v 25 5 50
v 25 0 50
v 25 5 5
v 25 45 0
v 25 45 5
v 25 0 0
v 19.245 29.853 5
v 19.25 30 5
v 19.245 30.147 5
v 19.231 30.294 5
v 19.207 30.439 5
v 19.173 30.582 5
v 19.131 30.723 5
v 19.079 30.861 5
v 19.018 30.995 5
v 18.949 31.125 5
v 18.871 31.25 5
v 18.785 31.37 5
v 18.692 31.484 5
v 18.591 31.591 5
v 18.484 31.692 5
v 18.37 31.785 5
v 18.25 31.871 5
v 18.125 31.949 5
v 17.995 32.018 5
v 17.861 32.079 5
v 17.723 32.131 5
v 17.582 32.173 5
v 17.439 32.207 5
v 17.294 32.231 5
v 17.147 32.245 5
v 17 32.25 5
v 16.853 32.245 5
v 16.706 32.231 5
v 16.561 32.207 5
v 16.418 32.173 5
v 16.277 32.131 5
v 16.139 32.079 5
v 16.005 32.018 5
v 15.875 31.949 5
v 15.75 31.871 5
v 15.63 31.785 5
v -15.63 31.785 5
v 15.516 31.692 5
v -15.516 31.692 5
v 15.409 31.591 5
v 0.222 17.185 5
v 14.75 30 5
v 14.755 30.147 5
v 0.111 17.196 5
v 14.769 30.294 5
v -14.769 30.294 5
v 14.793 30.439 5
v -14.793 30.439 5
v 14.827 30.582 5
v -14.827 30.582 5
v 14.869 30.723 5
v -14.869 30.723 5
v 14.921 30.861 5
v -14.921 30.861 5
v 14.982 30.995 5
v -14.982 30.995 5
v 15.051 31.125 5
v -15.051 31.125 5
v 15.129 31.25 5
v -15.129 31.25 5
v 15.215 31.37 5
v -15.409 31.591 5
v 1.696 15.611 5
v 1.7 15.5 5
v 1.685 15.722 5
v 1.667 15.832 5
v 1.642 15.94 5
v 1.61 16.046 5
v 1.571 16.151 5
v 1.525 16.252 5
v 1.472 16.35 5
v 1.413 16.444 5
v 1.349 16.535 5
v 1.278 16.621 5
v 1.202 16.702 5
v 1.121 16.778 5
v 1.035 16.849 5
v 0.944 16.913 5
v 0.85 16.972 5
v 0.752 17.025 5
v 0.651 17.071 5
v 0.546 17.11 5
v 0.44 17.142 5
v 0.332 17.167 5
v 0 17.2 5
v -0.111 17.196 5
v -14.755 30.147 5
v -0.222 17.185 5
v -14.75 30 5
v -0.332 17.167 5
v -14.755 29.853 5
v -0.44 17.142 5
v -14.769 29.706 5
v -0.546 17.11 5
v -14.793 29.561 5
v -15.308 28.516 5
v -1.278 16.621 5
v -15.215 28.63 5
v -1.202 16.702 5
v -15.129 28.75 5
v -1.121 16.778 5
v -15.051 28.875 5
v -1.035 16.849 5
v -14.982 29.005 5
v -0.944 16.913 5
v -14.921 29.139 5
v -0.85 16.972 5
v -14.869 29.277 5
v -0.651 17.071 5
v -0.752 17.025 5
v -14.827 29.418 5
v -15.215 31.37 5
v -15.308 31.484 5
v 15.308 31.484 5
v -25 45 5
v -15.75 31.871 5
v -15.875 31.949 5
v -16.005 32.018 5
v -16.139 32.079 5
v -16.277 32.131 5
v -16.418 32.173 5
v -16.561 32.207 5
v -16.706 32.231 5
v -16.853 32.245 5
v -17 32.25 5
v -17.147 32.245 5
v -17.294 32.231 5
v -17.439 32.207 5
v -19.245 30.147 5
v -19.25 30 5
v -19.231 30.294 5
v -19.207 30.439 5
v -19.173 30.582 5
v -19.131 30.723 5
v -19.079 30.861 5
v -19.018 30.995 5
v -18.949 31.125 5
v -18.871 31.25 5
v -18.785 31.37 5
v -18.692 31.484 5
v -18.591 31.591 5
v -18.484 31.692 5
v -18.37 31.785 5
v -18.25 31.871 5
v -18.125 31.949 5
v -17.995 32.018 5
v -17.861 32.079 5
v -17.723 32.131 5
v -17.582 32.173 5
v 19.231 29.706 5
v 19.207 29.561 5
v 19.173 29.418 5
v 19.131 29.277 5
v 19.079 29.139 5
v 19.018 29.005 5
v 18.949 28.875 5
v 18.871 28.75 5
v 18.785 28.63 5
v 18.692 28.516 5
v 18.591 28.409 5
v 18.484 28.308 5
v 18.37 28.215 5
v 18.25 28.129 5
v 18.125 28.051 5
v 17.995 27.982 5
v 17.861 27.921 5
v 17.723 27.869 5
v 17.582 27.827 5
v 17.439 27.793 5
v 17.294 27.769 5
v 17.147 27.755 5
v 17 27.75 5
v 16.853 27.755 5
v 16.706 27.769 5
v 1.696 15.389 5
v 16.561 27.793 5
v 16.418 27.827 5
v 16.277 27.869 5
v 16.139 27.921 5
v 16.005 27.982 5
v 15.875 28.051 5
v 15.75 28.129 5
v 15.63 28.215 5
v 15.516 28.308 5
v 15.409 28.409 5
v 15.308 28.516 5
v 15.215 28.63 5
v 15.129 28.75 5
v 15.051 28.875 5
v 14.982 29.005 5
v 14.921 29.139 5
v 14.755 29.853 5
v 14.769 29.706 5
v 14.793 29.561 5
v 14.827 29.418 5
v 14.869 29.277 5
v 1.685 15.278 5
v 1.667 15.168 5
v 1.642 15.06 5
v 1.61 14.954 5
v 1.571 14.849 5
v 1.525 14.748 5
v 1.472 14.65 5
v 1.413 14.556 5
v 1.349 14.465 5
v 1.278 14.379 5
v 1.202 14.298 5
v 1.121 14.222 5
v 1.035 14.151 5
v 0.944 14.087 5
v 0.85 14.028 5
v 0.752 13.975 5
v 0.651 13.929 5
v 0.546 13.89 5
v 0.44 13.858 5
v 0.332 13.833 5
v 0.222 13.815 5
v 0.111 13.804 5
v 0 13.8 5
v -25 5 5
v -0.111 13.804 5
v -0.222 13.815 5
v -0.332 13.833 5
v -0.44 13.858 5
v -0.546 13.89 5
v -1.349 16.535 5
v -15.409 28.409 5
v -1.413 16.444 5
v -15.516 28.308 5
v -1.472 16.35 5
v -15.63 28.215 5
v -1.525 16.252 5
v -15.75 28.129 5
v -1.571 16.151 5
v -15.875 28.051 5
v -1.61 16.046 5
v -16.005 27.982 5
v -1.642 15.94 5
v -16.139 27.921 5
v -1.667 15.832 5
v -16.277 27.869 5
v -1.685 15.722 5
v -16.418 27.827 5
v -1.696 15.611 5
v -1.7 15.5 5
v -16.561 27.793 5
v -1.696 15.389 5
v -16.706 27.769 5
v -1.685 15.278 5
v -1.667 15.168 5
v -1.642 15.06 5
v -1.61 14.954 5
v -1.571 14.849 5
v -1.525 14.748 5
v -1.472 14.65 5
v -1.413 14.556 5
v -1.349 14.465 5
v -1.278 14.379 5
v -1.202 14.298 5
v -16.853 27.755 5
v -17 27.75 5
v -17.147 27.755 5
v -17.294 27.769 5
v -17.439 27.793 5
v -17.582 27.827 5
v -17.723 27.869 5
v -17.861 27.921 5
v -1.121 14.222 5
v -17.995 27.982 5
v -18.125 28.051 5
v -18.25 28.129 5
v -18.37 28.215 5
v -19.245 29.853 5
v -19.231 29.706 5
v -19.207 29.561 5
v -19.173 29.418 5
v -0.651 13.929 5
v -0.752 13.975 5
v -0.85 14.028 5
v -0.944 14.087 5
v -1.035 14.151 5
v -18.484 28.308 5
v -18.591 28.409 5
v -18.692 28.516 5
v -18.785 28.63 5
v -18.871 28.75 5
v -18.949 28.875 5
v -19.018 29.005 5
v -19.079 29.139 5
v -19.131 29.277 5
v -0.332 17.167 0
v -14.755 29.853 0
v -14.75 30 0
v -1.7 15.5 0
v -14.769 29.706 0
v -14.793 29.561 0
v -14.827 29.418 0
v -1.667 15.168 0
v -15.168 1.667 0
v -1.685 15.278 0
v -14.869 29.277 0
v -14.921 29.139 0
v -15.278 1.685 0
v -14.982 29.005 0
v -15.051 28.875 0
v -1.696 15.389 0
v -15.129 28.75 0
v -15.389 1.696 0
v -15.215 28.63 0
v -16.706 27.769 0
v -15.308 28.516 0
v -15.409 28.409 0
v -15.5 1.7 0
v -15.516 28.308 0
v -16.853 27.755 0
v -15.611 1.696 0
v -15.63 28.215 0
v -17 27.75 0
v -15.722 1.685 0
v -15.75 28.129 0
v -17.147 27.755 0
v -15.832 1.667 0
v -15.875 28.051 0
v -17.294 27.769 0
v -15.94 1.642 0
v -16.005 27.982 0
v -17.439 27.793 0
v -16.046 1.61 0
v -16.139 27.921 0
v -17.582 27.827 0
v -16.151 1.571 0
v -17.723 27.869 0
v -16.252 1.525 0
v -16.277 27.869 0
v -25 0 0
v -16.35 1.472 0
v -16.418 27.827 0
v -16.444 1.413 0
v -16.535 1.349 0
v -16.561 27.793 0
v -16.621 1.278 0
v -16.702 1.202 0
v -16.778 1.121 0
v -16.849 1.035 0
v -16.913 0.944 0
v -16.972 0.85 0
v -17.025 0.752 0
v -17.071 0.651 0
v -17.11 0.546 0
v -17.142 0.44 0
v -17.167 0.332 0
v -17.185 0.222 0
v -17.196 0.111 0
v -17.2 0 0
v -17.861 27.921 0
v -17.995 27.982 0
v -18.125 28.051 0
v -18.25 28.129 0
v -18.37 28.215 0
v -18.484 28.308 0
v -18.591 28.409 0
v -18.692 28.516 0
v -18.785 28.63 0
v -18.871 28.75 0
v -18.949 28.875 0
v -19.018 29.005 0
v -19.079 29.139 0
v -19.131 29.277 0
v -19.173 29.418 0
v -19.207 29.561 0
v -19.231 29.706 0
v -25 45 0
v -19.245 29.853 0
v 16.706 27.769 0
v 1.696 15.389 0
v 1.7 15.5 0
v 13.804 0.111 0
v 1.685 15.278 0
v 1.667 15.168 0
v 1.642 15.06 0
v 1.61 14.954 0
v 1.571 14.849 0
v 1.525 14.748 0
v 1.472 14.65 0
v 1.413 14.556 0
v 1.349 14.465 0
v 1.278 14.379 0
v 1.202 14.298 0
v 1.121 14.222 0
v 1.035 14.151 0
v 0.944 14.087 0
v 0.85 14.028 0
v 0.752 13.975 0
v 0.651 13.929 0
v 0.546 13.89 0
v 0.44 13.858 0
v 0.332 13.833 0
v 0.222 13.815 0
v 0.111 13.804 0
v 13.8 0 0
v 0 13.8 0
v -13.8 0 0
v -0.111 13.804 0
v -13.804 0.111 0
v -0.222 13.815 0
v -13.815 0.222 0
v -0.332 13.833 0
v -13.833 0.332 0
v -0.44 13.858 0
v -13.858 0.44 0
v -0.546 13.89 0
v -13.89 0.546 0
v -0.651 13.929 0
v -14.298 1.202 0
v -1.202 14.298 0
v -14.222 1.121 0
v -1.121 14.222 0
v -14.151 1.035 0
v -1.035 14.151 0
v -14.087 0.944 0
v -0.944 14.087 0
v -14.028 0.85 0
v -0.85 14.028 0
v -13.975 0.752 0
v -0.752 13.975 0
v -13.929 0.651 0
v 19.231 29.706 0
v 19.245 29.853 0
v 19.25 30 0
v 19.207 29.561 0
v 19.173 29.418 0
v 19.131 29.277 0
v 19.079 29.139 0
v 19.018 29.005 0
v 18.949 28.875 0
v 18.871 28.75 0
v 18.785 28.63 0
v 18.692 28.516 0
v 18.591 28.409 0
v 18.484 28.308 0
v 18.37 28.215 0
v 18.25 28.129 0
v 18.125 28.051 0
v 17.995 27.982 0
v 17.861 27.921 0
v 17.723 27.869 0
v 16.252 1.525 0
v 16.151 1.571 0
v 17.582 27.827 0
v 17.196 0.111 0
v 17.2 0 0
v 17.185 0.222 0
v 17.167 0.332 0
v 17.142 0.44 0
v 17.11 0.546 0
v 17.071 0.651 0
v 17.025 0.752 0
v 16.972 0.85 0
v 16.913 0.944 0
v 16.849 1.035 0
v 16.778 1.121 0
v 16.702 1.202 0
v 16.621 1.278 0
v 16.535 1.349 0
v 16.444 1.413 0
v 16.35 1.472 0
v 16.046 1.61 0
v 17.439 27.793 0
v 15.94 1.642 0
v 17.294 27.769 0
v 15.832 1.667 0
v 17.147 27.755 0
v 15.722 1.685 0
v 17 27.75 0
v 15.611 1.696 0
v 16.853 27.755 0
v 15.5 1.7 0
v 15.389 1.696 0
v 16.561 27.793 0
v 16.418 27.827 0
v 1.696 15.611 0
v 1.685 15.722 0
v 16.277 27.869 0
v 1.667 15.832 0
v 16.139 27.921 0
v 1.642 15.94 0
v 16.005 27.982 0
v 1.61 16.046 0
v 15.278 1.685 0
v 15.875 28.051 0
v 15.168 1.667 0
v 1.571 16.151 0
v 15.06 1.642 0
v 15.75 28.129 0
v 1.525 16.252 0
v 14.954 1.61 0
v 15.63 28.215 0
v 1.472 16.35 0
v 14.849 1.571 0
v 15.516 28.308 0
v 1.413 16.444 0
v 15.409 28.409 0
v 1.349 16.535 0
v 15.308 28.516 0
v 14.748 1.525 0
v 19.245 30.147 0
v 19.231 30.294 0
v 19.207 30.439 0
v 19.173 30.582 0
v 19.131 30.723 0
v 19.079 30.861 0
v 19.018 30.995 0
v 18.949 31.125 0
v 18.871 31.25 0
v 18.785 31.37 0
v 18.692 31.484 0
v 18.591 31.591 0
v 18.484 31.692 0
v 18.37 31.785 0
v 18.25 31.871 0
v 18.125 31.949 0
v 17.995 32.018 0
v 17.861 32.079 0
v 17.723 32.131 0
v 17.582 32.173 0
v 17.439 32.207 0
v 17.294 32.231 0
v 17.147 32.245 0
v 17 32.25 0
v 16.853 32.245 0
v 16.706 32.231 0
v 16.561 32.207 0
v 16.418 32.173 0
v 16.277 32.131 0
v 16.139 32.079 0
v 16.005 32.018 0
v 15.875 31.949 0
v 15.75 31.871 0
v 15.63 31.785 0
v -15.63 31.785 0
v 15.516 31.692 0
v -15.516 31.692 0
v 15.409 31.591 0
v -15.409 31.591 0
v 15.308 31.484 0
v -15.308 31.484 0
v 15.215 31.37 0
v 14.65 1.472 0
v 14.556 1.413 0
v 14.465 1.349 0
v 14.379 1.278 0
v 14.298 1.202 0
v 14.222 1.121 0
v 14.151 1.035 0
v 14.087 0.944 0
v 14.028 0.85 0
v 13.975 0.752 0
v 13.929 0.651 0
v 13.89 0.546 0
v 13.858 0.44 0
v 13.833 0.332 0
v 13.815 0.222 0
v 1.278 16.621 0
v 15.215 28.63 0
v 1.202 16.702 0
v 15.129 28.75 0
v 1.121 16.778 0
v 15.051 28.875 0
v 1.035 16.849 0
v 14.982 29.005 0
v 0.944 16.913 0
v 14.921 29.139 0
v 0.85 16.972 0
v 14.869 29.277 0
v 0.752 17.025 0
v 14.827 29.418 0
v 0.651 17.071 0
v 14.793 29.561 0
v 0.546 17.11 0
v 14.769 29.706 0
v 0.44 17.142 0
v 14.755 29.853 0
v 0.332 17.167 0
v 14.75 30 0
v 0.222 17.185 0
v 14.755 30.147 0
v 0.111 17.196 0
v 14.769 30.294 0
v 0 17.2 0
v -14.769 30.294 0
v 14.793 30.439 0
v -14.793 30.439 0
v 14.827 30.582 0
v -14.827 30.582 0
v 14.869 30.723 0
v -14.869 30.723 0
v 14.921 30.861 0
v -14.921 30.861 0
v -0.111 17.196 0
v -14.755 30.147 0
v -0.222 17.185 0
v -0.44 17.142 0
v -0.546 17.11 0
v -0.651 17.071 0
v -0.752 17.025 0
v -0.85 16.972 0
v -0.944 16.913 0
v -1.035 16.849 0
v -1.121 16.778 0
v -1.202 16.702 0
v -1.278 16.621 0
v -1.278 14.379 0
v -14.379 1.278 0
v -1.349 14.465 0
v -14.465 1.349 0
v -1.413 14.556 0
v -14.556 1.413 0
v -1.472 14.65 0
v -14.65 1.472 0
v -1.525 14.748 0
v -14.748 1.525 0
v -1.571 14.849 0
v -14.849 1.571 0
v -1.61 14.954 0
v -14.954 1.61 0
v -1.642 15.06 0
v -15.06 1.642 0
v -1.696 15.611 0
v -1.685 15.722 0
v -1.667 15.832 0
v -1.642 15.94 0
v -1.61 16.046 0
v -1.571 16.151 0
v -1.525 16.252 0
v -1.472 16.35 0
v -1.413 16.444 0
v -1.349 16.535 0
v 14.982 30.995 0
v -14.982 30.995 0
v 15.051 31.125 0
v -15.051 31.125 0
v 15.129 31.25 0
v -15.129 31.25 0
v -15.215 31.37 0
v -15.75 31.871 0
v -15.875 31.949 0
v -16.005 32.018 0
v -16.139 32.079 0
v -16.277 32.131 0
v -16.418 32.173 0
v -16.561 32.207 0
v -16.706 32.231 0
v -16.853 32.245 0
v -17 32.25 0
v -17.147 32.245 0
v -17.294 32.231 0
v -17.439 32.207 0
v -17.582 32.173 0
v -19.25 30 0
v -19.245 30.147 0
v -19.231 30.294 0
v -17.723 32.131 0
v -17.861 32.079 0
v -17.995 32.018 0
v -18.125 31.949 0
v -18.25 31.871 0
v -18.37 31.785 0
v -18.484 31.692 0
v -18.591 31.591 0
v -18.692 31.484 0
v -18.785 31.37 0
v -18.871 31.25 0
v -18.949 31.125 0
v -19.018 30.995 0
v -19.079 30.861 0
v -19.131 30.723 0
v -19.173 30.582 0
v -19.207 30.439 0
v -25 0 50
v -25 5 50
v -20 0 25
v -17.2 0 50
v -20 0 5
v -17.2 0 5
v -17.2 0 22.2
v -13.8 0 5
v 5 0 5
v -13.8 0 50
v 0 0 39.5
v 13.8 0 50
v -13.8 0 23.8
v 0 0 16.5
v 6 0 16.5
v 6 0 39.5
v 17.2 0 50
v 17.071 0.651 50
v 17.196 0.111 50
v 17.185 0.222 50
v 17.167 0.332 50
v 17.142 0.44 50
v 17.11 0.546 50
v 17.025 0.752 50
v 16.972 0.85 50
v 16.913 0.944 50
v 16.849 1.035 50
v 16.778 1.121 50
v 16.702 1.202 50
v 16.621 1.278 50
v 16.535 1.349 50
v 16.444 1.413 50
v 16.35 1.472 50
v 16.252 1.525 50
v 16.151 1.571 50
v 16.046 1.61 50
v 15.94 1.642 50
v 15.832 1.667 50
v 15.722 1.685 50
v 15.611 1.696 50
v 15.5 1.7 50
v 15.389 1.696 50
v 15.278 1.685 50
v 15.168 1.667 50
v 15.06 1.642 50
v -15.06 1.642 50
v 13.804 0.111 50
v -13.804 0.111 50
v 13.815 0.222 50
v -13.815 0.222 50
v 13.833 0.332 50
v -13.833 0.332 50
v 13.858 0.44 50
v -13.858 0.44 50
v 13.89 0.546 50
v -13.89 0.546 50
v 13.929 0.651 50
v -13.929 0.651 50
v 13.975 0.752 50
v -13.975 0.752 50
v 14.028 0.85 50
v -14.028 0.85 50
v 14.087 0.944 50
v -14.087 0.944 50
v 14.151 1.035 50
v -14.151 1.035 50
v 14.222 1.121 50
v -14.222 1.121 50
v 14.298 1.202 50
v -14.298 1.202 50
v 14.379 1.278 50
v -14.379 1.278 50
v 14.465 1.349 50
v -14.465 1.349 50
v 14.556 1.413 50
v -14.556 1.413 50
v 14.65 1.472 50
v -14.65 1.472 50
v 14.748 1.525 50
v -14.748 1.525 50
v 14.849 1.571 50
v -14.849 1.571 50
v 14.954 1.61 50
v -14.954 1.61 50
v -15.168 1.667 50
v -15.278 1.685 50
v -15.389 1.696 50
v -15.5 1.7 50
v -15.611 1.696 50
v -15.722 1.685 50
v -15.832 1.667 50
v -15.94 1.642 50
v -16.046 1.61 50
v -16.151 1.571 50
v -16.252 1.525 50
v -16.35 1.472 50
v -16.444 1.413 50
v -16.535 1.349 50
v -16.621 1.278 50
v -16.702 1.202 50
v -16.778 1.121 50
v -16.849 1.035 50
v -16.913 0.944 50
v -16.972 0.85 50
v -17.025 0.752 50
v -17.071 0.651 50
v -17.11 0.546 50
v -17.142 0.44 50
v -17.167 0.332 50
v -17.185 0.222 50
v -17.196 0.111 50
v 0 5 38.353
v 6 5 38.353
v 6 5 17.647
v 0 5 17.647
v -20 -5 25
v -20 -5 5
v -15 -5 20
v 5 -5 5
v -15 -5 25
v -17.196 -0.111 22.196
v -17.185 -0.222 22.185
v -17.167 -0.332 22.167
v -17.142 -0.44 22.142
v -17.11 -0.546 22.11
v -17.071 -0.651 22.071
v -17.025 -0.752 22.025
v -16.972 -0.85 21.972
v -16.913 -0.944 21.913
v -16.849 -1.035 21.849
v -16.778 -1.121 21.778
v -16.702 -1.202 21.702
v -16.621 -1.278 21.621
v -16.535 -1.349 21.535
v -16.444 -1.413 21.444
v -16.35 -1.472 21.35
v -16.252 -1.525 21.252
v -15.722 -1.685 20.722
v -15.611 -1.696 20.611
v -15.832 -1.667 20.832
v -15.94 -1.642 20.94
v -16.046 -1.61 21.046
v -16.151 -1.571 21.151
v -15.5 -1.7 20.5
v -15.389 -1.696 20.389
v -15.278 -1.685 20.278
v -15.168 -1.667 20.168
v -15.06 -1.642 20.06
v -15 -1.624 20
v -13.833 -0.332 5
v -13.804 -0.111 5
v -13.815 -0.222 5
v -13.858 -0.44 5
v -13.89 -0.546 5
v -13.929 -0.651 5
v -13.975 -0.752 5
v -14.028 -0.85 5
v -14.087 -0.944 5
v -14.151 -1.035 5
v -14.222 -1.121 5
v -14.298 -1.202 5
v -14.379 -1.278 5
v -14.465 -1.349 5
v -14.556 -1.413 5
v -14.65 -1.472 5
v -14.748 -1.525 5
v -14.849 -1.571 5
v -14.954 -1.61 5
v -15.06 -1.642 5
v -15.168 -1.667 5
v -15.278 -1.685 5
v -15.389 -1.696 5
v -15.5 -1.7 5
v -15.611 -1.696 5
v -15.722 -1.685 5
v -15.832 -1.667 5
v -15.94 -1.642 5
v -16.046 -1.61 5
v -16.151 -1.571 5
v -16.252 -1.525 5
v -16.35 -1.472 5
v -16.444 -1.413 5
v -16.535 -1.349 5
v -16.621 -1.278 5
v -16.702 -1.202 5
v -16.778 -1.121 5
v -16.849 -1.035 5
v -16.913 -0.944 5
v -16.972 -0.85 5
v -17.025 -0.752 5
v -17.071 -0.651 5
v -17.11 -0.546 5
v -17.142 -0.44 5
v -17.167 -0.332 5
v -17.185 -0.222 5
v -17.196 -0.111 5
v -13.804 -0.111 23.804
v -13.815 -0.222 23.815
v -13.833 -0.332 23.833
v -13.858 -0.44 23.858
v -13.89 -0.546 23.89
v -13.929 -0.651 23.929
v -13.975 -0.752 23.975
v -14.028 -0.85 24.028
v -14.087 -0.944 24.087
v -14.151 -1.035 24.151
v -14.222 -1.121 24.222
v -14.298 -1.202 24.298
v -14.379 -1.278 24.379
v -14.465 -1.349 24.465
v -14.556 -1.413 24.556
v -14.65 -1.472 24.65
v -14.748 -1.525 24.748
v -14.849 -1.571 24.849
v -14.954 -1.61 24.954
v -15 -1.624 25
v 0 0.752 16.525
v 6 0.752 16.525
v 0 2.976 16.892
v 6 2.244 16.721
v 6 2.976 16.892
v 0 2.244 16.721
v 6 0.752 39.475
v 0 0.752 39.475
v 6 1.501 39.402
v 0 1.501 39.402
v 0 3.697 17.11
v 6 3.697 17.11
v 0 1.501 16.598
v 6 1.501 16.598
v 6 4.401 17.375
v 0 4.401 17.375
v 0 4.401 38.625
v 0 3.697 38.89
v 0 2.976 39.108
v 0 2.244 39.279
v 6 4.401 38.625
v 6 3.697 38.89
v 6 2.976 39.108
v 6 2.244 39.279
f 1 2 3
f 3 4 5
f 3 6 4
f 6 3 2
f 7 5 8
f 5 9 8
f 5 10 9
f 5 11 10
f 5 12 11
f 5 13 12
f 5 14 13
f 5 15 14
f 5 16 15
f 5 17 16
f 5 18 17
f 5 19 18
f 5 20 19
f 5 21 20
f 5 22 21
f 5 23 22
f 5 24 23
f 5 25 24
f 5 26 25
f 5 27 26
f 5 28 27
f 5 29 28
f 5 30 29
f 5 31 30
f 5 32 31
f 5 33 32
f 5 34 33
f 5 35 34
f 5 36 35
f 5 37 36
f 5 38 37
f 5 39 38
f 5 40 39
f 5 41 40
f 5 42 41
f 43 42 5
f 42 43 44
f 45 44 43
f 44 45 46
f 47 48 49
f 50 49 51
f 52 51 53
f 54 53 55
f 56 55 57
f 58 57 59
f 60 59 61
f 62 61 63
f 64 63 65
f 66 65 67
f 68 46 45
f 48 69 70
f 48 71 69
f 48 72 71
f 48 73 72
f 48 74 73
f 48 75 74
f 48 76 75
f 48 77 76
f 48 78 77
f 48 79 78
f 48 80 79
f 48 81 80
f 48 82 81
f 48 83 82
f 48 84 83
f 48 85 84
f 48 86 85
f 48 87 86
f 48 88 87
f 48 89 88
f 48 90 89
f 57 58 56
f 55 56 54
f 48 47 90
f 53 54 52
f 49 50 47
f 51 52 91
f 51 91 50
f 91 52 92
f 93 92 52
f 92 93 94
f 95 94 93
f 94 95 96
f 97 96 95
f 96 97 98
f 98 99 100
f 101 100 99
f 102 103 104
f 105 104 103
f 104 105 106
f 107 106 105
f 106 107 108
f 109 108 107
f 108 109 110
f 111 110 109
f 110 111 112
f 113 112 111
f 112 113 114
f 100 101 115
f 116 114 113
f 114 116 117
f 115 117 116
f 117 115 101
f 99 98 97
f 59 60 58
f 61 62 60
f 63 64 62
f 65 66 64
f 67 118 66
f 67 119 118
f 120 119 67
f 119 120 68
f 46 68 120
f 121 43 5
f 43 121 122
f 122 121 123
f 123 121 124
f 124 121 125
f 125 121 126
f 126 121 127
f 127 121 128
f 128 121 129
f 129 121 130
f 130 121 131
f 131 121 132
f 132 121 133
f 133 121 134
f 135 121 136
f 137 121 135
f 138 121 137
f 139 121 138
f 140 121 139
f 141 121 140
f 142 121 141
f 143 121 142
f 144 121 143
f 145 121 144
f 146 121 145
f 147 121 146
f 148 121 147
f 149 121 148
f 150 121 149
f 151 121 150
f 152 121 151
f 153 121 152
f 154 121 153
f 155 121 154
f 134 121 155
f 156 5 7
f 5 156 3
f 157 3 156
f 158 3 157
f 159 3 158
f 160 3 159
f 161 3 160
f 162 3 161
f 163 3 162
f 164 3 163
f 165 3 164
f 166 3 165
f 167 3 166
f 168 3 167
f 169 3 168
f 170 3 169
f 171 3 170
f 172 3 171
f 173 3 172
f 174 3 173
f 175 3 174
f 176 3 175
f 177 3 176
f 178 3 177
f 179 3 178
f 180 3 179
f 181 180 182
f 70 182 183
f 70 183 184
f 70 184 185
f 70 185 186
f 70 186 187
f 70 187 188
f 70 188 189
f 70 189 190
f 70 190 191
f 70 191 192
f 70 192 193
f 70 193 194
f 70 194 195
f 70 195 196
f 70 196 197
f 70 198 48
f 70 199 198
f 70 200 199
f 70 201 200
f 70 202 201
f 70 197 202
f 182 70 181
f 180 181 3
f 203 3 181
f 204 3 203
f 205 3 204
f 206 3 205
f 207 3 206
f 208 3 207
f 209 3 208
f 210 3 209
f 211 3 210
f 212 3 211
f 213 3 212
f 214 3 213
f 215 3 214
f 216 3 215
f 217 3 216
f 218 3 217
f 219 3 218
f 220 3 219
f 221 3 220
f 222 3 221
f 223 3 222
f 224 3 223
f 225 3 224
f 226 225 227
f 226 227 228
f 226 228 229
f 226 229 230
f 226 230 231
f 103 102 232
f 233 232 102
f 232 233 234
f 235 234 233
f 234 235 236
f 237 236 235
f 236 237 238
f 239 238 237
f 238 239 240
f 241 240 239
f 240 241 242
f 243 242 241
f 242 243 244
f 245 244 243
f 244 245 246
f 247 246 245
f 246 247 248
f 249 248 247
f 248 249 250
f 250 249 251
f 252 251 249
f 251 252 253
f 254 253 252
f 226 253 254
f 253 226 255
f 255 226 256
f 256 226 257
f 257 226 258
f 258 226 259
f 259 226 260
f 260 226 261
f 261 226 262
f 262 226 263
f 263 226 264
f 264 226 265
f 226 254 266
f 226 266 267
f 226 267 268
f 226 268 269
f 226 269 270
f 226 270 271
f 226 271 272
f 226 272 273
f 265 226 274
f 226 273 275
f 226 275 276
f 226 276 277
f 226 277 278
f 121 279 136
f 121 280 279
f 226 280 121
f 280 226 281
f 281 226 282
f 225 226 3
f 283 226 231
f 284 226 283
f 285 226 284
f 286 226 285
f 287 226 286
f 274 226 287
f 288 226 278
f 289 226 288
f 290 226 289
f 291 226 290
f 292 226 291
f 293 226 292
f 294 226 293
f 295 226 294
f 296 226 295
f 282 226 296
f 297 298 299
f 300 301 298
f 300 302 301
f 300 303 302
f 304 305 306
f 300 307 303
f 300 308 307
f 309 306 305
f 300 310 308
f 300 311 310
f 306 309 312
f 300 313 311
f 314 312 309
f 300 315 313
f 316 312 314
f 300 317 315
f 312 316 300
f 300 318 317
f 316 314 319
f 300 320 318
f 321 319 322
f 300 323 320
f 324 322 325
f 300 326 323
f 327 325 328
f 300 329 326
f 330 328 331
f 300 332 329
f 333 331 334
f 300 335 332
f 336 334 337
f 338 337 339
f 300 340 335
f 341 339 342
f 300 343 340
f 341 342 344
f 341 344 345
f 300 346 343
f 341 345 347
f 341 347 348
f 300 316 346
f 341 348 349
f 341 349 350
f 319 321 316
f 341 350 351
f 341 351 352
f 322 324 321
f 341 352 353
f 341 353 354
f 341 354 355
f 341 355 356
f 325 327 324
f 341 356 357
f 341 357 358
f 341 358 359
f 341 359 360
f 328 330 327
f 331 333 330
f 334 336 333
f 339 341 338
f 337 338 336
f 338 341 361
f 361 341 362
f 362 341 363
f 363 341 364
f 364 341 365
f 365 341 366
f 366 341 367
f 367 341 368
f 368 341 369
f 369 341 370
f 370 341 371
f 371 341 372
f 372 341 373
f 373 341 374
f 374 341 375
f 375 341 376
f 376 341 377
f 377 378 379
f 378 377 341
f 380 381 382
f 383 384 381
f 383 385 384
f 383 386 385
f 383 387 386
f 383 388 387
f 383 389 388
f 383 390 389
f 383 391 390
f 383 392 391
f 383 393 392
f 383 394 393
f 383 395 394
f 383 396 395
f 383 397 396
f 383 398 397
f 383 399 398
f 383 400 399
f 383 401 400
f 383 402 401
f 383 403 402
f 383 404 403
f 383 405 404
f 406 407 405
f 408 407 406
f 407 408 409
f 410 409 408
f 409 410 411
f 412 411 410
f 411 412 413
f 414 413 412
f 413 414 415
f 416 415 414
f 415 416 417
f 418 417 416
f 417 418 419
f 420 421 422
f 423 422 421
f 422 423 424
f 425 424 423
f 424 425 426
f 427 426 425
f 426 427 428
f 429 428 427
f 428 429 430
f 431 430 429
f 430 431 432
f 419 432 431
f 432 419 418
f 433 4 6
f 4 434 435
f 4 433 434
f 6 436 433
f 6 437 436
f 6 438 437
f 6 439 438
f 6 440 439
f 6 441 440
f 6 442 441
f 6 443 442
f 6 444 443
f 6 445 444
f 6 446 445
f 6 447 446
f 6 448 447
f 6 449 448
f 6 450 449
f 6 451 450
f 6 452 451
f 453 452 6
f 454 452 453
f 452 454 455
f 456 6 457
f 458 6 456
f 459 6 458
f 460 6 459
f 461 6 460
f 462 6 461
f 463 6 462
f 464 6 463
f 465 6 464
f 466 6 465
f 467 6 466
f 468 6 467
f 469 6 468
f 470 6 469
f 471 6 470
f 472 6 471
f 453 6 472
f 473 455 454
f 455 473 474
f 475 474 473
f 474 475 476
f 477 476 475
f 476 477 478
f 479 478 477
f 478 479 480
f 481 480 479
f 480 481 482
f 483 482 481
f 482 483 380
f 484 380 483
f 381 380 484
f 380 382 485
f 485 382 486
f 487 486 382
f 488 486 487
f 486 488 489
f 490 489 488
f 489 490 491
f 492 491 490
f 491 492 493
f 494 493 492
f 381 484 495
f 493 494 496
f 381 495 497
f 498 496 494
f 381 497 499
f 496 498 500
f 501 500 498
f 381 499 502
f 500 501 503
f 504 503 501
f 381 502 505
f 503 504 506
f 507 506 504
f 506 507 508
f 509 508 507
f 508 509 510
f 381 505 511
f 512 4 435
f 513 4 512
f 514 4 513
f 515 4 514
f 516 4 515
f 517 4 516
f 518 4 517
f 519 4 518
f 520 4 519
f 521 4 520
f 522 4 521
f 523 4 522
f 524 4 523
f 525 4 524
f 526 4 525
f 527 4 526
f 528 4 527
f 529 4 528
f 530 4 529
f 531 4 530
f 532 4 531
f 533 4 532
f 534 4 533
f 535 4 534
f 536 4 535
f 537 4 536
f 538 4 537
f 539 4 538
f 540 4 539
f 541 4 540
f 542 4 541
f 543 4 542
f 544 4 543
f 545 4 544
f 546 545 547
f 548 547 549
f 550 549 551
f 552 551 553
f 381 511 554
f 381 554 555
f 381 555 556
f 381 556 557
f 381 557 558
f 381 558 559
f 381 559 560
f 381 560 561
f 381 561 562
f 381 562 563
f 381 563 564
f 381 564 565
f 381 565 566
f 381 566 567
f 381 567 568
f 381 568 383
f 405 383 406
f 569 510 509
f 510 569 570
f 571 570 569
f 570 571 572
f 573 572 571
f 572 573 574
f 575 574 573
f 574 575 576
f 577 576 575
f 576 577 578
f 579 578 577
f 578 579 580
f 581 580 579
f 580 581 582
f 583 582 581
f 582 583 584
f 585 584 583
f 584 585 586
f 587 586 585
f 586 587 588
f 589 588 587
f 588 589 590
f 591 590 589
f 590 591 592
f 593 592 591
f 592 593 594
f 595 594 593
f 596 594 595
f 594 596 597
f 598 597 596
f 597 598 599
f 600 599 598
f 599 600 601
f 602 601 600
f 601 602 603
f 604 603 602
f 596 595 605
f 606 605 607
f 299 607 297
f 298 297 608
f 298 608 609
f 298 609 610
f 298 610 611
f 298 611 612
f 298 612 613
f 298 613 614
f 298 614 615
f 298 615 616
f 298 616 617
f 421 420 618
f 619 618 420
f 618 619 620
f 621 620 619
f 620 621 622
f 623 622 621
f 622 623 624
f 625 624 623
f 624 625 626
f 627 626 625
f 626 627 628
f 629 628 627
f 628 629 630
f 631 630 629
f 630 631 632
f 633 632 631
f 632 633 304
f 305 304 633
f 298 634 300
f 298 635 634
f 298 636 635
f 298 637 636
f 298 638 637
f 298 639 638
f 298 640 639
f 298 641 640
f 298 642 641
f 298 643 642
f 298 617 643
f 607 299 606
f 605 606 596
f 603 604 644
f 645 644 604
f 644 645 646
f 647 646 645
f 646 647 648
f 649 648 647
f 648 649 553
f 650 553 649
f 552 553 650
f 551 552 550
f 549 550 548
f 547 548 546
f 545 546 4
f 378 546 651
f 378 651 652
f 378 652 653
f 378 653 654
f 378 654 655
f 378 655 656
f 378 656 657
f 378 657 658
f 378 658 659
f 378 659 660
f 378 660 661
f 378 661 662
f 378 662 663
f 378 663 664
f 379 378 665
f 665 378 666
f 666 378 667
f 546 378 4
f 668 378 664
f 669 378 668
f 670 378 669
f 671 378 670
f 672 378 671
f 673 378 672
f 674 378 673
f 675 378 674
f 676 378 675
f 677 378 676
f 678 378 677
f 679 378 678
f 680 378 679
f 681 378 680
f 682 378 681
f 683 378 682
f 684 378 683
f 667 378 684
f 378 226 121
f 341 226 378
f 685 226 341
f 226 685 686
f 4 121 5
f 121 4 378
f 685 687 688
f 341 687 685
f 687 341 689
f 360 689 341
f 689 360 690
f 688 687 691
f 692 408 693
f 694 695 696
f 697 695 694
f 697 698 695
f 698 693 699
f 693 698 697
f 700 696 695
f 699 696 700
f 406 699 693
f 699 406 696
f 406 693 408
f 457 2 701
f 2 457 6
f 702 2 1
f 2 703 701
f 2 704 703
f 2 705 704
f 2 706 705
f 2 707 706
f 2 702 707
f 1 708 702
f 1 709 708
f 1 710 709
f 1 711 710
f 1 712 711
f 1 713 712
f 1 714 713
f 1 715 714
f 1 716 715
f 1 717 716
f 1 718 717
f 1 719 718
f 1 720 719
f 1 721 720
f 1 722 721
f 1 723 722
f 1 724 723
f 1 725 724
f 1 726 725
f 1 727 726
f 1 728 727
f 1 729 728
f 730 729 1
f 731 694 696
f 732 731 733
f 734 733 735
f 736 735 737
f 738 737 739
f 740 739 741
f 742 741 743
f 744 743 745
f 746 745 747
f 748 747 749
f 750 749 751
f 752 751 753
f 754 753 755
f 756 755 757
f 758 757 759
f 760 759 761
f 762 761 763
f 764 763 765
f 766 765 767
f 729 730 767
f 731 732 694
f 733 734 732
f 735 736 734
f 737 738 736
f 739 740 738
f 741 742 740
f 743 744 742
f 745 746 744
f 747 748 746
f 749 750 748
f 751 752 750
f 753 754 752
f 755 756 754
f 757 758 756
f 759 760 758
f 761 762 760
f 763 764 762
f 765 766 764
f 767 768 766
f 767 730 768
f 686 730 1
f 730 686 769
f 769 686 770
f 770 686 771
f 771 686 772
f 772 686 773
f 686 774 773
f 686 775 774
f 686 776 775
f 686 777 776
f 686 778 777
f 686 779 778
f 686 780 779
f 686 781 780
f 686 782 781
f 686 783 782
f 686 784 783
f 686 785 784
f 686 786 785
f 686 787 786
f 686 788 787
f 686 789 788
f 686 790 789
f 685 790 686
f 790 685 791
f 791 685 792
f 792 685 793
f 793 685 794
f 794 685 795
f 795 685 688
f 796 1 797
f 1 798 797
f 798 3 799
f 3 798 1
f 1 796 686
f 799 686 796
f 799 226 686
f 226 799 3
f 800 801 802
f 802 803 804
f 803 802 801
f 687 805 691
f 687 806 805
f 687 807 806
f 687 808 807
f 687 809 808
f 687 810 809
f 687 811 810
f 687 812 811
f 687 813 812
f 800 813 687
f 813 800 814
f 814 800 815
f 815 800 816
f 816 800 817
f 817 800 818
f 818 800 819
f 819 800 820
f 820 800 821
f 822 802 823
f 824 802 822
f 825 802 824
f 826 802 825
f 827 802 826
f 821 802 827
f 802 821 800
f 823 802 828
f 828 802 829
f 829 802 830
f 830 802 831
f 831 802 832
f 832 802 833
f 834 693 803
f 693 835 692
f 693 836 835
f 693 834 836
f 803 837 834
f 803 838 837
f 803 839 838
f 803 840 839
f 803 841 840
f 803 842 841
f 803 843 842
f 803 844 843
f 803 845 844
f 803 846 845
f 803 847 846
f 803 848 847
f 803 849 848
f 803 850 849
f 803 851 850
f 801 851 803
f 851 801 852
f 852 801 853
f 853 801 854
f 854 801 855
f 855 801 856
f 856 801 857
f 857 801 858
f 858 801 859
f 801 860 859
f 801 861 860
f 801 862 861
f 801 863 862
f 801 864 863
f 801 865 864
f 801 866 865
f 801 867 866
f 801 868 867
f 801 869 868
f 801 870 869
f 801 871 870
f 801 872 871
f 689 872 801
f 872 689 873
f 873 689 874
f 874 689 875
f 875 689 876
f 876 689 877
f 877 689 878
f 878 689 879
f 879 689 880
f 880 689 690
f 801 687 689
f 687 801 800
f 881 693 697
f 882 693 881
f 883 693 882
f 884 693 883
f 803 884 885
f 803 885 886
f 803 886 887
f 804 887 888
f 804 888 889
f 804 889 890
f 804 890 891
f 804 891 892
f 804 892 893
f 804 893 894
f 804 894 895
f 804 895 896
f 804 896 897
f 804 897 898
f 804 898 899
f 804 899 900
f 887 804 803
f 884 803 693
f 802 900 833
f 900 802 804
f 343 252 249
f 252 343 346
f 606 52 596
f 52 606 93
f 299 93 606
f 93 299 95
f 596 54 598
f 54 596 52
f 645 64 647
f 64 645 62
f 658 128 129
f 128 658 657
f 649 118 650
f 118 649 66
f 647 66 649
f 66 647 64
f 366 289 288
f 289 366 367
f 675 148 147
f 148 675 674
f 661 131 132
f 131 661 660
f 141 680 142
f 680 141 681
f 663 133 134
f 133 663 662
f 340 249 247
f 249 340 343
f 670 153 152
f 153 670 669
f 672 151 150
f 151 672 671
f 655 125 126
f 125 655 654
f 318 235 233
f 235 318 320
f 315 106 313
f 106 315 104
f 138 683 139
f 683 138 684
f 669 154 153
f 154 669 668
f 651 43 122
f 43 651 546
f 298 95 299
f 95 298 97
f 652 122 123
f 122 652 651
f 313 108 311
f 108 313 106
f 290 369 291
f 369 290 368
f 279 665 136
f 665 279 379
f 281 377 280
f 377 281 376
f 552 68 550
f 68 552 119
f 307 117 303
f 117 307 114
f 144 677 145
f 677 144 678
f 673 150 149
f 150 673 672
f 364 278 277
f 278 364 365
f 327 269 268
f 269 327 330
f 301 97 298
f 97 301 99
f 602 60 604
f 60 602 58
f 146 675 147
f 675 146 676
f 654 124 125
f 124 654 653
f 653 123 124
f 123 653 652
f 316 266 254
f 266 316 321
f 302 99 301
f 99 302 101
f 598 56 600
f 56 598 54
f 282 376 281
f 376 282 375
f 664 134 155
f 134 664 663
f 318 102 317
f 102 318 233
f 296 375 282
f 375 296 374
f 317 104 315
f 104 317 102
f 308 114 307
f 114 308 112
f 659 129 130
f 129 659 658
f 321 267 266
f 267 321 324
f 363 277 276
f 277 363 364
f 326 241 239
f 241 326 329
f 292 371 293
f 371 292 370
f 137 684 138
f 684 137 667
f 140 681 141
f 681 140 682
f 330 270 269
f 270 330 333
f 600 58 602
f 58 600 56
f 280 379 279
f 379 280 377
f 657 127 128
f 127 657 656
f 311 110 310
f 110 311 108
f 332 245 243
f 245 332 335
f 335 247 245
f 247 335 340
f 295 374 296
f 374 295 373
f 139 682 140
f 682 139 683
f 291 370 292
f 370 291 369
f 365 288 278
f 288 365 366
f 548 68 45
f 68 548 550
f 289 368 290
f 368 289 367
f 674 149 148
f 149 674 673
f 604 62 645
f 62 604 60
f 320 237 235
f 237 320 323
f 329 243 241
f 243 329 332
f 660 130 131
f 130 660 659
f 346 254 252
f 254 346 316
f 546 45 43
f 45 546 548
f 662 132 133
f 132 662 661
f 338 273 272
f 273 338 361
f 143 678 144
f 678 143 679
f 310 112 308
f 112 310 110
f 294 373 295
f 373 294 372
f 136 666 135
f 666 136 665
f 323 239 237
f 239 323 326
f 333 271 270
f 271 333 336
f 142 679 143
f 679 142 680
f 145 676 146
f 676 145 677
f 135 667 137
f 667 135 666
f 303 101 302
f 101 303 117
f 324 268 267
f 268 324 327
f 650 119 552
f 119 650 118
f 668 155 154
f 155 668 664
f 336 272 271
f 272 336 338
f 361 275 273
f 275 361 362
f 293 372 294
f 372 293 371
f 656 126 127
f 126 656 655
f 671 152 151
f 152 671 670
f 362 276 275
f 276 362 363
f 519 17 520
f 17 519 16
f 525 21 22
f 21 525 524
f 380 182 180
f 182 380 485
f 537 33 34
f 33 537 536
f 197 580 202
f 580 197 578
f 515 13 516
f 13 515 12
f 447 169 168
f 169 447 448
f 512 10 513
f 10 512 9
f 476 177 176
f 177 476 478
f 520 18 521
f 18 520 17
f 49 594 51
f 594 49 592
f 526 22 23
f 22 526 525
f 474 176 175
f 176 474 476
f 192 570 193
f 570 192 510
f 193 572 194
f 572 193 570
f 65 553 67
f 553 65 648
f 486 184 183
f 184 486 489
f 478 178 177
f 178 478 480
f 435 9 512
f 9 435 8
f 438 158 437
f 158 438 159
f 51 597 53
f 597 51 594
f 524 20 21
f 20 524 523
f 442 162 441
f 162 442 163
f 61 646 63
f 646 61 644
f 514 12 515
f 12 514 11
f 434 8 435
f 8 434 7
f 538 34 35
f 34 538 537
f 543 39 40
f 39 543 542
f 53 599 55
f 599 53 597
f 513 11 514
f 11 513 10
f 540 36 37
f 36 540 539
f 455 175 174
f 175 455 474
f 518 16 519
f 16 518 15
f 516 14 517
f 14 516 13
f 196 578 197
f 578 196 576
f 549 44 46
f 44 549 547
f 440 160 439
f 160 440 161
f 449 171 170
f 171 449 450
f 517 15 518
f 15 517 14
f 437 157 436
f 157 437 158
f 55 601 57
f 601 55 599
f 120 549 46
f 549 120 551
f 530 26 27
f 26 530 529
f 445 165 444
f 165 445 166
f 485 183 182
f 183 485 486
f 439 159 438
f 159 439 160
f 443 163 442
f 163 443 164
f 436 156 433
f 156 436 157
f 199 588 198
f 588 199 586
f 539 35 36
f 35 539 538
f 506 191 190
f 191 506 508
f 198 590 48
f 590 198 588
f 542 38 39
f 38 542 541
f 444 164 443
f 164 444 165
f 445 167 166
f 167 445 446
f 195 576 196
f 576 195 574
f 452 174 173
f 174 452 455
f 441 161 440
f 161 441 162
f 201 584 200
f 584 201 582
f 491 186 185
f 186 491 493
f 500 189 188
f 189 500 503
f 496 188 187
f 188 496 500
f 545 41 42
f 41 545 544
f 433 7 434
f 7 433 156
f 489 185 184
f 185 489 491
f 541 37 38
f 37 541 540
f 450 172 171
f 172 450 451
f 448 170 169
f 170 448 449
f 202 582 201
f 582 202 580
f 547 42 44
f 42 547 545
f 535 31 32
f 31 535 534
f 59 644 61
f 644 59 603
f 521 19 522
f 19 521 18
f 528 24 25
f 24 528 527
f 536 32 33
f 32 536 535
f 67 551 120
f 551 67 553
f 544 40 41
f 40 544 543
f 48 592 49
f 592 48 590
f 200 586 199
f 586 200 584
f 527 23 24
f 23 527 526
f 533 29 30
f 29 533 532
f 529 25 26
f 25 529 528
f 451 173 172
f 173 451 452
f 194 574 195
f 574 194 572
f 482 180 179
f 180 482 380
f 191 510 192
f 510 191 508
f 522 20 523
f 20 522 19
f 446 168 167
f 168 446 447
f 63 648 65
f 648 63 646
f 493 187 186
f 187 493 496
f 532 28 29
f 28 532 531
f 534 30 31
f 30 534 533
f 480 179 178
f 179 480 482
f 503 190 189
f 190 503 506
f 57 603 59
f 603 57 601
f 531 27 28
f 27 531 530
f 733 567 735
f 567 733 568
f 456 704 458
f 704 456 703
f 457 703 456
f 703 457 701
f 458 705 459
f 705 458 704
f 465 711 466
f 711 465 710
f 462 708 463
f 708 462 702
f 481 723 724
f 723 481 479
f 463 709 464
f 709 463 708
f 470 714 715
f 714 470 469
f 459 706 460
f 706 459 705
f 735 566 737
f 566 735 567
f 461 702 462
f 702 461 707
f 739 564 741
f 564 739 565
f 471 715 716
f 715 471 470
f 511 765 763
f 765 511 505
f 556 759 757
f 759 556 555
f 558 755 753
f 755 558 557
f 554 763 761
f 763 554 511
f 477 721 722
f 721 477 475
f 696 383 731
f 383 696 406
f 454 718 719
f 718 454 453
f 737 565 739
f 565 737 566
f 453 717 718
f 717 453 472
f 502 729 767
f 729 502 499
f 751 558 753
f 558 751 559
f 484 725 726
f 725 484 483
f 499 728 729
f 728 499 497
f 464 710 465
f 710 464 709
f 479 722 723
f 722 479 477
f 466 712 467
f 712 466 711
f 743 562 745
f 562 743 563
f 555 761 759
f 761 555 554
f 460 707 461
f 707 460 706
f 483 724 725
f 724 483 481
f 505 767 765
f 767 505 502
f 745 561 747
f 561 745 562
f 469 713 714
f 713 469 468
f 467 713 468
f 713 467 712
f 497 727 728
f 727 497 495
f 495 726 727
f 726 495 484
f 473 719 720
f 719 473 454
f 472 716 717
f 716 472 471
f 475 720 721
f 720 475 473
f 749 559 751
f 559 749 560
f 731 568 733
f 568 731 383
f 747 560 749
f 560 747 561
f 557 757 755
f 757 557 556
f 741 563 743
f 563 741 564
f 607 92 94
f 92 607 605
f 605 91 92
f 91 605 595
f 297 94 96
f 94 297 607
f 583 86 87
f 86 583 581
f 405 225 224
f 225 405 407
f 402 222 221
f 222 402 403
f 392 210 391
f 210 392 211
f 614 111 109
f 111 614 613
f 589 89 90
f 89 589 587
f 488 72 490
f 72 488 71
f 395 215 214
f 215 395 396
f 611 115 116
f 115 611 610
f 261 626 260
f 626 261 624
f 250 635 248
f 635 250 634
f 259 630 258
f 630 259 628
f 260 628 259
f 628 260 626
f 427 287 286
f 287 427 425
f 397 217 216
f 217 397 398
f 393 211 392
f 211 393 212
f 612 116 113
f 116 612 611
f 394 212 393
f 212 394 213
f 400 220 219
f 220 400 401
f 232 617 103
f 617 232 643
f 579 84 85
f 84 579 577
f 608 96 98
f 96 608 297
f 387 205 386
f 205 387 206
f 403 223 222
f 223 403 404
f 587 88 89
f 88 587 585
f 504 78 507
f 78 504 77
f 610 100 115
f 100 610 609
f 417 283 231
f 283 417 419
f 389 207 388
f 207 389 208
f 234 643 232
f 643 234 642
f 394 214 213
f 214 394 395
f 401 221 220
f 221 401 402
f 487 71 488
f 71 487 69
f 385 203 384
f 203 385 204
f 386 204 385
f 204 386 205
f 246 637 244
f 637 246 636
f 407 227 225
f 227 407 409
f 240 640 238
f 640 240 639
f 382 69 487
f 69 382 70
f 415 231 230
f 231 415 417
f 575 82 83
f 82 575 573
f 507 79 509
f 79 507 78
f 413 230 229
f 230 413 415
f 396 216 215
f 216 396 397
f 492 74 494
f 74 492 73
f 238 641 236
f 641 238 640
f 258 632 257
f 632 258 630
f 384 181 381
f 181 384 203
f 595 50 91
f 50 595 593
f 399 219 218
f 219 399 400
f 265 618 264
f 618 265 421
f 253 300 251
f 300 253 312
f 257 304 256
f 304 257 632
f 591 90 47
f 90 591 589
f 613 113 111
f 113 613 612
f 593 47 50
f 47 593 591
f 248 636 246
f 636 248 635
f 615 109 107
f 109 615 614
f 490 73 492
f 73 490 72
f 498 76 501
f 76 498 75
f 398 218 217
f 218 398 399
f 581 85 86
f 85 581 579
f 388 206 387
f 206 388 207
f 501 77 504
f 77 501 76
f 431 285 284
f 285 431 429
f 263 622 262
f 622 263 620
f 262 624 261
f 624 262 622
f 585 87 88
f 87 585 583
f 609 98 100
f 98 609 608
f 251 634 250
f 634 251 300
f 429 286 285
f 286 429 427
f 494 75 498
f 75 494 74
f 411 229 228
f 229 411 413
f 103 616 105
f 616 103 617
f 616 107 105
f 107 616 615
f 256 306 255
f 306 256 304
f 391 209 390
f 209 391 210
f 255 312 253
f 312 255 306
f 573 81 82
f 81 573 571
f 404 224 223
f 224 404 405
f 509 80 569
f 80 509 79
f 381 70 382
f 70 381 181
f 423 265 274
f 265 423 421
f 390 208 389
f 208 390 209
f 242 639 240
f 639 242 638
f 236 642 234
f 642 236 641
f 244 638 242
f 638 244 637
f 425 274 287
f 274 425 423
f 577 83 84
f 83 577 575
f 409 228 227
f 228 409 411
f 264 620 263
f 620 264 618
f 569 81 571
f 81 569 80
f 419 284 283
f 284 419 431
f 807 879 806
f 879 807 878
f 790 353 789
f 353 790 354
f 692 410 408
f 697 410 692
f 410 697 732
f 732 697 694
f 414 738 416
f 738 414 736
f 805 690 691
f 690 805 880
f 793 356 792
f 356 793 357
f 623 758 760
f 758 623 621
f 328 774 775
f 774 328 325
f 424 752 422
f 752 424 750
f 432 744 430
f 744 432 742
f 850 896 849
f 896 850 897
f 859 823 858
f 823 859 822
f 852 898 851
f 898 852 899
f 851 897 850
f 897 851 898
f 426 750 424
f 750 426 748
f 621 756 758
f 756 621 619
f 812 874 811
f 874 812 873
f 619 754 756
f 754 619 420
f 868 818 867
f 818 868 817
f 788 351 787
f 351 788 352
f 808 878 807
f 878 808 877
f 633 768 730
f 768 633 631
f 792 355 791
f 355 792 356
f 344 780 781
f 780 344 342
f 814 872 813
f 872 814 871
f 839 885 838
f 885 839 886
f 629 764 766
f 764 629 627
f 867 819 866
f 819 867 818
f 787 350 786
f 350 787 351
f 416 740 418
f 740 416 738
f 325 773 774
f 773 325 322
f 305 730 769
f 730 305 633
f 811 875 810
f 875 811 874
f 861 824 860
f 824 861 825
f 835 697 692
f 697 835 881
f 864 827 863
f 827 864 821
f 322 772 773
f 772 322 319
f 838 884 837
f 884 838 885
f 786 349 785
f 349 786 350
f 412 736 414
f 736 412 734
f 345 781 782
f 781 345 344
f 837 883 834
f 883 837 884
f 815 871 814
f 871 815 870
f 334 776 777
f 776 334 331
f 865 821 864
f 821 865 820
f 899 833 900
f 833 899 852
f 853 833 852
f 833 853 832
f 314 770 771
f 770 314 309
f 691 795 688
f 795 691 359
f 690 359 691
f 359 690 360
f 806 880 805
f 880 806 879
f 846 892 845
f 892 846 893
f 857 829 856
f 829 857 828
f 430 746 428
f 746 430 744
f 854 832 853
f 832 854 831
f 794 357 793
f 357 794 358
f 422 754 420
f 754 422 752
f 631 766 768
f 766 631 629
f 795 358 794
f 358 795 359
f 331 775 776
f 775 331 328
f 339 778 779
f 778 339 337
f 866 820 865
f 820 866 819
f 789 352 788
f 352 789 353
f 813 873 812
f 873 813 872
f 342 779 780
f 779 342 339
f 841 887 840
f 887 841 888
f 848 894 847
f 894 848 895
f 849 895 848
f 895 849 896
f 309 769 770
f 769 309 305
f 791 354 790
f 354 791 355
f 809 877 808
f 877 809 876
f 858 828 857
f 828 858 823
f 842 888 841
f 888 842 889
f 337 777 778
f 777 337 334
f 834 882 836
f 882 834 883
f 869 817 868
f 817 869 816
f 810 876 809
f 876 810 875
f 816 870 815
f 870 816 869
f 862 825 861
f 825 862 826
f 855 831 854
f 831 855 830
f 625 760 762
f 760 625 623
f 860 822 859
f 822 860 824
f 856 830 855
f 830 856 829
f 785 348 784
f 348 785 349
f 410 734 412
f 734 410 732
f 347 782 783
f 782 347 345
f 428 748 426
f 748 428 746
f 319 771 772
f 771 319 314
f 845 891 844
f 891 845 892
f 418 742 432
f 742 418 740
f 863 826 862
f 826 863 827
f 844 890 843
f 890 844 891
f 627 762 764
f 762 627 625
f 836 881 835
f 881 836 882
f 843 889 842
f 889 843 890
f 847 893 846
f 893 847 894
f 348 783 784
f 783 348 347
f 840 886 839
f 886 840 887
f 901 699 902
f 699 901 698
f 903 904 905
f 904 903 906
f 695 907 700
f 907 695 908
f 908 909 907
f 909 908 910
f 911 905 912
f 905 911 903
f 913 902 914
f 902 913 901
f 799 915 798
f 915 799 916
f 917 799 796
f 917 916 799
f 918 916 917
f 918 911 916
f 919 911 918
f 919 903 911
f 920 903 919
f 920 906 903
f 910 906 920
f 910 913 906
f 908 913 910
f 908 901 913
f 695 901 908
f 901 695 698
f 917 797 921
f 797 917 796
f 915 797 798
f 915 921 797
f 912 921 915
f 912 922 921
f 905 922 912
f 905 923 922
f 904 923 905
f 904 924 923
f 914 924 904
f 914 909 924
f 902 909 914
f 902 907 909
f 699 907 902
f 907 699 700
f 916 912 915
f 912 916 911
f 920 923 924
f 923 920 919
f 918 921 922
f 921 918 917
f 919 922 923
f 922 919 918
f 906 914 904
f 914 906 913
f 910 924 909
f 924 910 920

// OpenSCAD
// L-shaped mounting bracket for a NEMA 17 stepper motor (e.g. syringe pump)
// Print orientation: base plate on the bed (z = 0), motor plate builds upward.

// ---------------- Parameters ----------------
base_x0      = -25;   // base plate, x start
base_x1      = 25;    // base plate, x end
base_y0      = 0;     // base plate, y start
base_y1      = 45;    // base plate, y end
base_z0      = 0;     // base plate, z start
base_z1      = 5;     // base plate, z end

motor_x0     = -25;   // motor plate, x start
motor_x1     = 25;    // motor plate, x end
motor_y0     = 0;     // motor plate, y start
motor_y1     = 5;     // motor plate, y end (sits on back edge of base)
motor_z0     = 0;     // motor plate, z start
motor_z1     = 50;    // motor plate, z end

hole_m4_x1   = -17;   // M4 through-hole in base, x
hole_m4_y1   = 30;    // M4 through-hole in base, y
hole_m4_x2   = 17;    // M4 through-hole in base, x
hole_m4_y2   = 30;    // M4 through-hole in base, y
hole_m4_d    = 4.5;   // M4 hole diameter

boss_d       = 23;    // motor centring boss hole diameter
boss_x       = 0;     // boss hole centre, x
boss_z       = 28;    // boss hole centre, z

screw_d      = 3.4;   // M3 screw hole diameter
screw_n      = 4;     // number of screw holes
screw_a      = 31;    // square pattern side length

gusset_t     = 5;     // gusset thickness (X)
gusset_leg   = 20;    // right-triangle leg length (Y and Z)
gusset_x0    = -25;   // left gusset, x start
gusset_x1    = -20;   // left gusset, x end
gusset_y0    = 5;     // right-angle corner, y
gusset_z0    = 5;     // right-angle corner, z

eps          = 0.5;   // cutter overshoot past faces

$fn = 96;

// ---------------- Model ----------------
difference() {
    union() {
        // Base plate
        translate([base_x0, base_y0, base_z0])
            cube([base_x1 - base_x0, base_y1 - base_y0, base_z1 - base_z0]);

        // Vertical motor plate
        translate([motor_x0, motor_y0, motor_z0])
            cube([motor_x1 - motor_x0, motor_y1 - motor_y0, motor_z1 - motor_z0]);

        // Left triangular gusset (right triangle in YZ)
        translate([gusset_x0, 0, 0])
            rotate([90, 0, 0])
                linear_extrude(height = gusset_t)
                    polygon(points = [
                        [gusset_y0, gusset_z0],
                        [gusset_y0 + gusset_leg, gusset_z0],
                        [gusset_y0, gusset_z0 + gusset_leg]
                    ]);

        // Right triangular gusset (right triangle in YZ)
        translate([gusset_x1, 0, 0])
            rotate([90, 0, 0])
                linear_extrude(height = gusset_t)
                    polygon(points = [
                        [gusset_y0, gusset_z0],
                        [gusset_y0 + gusset_leg, gusset_z0],
                        [gusset_y0, gusset_z0 + gusset_leg]
                    ]);
    }

    // Base plate M4 through-holes
    for (i = [1 : 2])
        translate([hole_m4_x1 * (i == 1 ? 1 : -1), hole_m4_y1, -eps])
            cylinder(d = hole_m4_d, h = base_z1 - base_z0 + 2 * eps);

    // Motor boss hole (along Y)
    translate([boss_x, 0, boss_z])
        rotate([0, 90, 0])
            cylinder(d = boss_d, h = motor_y1 - motor_y0 + 2 * eps);

    // M3 screw holes on a square pattern, centred on the boss hole
    for (a = [0 : 90 : 270])
        rotate([0, 0, a])
            translate([screw_a / 2, 0, 0])
                cylinder(d = screw_d, h = motor_z1 - motor_z0 + eps);
}
